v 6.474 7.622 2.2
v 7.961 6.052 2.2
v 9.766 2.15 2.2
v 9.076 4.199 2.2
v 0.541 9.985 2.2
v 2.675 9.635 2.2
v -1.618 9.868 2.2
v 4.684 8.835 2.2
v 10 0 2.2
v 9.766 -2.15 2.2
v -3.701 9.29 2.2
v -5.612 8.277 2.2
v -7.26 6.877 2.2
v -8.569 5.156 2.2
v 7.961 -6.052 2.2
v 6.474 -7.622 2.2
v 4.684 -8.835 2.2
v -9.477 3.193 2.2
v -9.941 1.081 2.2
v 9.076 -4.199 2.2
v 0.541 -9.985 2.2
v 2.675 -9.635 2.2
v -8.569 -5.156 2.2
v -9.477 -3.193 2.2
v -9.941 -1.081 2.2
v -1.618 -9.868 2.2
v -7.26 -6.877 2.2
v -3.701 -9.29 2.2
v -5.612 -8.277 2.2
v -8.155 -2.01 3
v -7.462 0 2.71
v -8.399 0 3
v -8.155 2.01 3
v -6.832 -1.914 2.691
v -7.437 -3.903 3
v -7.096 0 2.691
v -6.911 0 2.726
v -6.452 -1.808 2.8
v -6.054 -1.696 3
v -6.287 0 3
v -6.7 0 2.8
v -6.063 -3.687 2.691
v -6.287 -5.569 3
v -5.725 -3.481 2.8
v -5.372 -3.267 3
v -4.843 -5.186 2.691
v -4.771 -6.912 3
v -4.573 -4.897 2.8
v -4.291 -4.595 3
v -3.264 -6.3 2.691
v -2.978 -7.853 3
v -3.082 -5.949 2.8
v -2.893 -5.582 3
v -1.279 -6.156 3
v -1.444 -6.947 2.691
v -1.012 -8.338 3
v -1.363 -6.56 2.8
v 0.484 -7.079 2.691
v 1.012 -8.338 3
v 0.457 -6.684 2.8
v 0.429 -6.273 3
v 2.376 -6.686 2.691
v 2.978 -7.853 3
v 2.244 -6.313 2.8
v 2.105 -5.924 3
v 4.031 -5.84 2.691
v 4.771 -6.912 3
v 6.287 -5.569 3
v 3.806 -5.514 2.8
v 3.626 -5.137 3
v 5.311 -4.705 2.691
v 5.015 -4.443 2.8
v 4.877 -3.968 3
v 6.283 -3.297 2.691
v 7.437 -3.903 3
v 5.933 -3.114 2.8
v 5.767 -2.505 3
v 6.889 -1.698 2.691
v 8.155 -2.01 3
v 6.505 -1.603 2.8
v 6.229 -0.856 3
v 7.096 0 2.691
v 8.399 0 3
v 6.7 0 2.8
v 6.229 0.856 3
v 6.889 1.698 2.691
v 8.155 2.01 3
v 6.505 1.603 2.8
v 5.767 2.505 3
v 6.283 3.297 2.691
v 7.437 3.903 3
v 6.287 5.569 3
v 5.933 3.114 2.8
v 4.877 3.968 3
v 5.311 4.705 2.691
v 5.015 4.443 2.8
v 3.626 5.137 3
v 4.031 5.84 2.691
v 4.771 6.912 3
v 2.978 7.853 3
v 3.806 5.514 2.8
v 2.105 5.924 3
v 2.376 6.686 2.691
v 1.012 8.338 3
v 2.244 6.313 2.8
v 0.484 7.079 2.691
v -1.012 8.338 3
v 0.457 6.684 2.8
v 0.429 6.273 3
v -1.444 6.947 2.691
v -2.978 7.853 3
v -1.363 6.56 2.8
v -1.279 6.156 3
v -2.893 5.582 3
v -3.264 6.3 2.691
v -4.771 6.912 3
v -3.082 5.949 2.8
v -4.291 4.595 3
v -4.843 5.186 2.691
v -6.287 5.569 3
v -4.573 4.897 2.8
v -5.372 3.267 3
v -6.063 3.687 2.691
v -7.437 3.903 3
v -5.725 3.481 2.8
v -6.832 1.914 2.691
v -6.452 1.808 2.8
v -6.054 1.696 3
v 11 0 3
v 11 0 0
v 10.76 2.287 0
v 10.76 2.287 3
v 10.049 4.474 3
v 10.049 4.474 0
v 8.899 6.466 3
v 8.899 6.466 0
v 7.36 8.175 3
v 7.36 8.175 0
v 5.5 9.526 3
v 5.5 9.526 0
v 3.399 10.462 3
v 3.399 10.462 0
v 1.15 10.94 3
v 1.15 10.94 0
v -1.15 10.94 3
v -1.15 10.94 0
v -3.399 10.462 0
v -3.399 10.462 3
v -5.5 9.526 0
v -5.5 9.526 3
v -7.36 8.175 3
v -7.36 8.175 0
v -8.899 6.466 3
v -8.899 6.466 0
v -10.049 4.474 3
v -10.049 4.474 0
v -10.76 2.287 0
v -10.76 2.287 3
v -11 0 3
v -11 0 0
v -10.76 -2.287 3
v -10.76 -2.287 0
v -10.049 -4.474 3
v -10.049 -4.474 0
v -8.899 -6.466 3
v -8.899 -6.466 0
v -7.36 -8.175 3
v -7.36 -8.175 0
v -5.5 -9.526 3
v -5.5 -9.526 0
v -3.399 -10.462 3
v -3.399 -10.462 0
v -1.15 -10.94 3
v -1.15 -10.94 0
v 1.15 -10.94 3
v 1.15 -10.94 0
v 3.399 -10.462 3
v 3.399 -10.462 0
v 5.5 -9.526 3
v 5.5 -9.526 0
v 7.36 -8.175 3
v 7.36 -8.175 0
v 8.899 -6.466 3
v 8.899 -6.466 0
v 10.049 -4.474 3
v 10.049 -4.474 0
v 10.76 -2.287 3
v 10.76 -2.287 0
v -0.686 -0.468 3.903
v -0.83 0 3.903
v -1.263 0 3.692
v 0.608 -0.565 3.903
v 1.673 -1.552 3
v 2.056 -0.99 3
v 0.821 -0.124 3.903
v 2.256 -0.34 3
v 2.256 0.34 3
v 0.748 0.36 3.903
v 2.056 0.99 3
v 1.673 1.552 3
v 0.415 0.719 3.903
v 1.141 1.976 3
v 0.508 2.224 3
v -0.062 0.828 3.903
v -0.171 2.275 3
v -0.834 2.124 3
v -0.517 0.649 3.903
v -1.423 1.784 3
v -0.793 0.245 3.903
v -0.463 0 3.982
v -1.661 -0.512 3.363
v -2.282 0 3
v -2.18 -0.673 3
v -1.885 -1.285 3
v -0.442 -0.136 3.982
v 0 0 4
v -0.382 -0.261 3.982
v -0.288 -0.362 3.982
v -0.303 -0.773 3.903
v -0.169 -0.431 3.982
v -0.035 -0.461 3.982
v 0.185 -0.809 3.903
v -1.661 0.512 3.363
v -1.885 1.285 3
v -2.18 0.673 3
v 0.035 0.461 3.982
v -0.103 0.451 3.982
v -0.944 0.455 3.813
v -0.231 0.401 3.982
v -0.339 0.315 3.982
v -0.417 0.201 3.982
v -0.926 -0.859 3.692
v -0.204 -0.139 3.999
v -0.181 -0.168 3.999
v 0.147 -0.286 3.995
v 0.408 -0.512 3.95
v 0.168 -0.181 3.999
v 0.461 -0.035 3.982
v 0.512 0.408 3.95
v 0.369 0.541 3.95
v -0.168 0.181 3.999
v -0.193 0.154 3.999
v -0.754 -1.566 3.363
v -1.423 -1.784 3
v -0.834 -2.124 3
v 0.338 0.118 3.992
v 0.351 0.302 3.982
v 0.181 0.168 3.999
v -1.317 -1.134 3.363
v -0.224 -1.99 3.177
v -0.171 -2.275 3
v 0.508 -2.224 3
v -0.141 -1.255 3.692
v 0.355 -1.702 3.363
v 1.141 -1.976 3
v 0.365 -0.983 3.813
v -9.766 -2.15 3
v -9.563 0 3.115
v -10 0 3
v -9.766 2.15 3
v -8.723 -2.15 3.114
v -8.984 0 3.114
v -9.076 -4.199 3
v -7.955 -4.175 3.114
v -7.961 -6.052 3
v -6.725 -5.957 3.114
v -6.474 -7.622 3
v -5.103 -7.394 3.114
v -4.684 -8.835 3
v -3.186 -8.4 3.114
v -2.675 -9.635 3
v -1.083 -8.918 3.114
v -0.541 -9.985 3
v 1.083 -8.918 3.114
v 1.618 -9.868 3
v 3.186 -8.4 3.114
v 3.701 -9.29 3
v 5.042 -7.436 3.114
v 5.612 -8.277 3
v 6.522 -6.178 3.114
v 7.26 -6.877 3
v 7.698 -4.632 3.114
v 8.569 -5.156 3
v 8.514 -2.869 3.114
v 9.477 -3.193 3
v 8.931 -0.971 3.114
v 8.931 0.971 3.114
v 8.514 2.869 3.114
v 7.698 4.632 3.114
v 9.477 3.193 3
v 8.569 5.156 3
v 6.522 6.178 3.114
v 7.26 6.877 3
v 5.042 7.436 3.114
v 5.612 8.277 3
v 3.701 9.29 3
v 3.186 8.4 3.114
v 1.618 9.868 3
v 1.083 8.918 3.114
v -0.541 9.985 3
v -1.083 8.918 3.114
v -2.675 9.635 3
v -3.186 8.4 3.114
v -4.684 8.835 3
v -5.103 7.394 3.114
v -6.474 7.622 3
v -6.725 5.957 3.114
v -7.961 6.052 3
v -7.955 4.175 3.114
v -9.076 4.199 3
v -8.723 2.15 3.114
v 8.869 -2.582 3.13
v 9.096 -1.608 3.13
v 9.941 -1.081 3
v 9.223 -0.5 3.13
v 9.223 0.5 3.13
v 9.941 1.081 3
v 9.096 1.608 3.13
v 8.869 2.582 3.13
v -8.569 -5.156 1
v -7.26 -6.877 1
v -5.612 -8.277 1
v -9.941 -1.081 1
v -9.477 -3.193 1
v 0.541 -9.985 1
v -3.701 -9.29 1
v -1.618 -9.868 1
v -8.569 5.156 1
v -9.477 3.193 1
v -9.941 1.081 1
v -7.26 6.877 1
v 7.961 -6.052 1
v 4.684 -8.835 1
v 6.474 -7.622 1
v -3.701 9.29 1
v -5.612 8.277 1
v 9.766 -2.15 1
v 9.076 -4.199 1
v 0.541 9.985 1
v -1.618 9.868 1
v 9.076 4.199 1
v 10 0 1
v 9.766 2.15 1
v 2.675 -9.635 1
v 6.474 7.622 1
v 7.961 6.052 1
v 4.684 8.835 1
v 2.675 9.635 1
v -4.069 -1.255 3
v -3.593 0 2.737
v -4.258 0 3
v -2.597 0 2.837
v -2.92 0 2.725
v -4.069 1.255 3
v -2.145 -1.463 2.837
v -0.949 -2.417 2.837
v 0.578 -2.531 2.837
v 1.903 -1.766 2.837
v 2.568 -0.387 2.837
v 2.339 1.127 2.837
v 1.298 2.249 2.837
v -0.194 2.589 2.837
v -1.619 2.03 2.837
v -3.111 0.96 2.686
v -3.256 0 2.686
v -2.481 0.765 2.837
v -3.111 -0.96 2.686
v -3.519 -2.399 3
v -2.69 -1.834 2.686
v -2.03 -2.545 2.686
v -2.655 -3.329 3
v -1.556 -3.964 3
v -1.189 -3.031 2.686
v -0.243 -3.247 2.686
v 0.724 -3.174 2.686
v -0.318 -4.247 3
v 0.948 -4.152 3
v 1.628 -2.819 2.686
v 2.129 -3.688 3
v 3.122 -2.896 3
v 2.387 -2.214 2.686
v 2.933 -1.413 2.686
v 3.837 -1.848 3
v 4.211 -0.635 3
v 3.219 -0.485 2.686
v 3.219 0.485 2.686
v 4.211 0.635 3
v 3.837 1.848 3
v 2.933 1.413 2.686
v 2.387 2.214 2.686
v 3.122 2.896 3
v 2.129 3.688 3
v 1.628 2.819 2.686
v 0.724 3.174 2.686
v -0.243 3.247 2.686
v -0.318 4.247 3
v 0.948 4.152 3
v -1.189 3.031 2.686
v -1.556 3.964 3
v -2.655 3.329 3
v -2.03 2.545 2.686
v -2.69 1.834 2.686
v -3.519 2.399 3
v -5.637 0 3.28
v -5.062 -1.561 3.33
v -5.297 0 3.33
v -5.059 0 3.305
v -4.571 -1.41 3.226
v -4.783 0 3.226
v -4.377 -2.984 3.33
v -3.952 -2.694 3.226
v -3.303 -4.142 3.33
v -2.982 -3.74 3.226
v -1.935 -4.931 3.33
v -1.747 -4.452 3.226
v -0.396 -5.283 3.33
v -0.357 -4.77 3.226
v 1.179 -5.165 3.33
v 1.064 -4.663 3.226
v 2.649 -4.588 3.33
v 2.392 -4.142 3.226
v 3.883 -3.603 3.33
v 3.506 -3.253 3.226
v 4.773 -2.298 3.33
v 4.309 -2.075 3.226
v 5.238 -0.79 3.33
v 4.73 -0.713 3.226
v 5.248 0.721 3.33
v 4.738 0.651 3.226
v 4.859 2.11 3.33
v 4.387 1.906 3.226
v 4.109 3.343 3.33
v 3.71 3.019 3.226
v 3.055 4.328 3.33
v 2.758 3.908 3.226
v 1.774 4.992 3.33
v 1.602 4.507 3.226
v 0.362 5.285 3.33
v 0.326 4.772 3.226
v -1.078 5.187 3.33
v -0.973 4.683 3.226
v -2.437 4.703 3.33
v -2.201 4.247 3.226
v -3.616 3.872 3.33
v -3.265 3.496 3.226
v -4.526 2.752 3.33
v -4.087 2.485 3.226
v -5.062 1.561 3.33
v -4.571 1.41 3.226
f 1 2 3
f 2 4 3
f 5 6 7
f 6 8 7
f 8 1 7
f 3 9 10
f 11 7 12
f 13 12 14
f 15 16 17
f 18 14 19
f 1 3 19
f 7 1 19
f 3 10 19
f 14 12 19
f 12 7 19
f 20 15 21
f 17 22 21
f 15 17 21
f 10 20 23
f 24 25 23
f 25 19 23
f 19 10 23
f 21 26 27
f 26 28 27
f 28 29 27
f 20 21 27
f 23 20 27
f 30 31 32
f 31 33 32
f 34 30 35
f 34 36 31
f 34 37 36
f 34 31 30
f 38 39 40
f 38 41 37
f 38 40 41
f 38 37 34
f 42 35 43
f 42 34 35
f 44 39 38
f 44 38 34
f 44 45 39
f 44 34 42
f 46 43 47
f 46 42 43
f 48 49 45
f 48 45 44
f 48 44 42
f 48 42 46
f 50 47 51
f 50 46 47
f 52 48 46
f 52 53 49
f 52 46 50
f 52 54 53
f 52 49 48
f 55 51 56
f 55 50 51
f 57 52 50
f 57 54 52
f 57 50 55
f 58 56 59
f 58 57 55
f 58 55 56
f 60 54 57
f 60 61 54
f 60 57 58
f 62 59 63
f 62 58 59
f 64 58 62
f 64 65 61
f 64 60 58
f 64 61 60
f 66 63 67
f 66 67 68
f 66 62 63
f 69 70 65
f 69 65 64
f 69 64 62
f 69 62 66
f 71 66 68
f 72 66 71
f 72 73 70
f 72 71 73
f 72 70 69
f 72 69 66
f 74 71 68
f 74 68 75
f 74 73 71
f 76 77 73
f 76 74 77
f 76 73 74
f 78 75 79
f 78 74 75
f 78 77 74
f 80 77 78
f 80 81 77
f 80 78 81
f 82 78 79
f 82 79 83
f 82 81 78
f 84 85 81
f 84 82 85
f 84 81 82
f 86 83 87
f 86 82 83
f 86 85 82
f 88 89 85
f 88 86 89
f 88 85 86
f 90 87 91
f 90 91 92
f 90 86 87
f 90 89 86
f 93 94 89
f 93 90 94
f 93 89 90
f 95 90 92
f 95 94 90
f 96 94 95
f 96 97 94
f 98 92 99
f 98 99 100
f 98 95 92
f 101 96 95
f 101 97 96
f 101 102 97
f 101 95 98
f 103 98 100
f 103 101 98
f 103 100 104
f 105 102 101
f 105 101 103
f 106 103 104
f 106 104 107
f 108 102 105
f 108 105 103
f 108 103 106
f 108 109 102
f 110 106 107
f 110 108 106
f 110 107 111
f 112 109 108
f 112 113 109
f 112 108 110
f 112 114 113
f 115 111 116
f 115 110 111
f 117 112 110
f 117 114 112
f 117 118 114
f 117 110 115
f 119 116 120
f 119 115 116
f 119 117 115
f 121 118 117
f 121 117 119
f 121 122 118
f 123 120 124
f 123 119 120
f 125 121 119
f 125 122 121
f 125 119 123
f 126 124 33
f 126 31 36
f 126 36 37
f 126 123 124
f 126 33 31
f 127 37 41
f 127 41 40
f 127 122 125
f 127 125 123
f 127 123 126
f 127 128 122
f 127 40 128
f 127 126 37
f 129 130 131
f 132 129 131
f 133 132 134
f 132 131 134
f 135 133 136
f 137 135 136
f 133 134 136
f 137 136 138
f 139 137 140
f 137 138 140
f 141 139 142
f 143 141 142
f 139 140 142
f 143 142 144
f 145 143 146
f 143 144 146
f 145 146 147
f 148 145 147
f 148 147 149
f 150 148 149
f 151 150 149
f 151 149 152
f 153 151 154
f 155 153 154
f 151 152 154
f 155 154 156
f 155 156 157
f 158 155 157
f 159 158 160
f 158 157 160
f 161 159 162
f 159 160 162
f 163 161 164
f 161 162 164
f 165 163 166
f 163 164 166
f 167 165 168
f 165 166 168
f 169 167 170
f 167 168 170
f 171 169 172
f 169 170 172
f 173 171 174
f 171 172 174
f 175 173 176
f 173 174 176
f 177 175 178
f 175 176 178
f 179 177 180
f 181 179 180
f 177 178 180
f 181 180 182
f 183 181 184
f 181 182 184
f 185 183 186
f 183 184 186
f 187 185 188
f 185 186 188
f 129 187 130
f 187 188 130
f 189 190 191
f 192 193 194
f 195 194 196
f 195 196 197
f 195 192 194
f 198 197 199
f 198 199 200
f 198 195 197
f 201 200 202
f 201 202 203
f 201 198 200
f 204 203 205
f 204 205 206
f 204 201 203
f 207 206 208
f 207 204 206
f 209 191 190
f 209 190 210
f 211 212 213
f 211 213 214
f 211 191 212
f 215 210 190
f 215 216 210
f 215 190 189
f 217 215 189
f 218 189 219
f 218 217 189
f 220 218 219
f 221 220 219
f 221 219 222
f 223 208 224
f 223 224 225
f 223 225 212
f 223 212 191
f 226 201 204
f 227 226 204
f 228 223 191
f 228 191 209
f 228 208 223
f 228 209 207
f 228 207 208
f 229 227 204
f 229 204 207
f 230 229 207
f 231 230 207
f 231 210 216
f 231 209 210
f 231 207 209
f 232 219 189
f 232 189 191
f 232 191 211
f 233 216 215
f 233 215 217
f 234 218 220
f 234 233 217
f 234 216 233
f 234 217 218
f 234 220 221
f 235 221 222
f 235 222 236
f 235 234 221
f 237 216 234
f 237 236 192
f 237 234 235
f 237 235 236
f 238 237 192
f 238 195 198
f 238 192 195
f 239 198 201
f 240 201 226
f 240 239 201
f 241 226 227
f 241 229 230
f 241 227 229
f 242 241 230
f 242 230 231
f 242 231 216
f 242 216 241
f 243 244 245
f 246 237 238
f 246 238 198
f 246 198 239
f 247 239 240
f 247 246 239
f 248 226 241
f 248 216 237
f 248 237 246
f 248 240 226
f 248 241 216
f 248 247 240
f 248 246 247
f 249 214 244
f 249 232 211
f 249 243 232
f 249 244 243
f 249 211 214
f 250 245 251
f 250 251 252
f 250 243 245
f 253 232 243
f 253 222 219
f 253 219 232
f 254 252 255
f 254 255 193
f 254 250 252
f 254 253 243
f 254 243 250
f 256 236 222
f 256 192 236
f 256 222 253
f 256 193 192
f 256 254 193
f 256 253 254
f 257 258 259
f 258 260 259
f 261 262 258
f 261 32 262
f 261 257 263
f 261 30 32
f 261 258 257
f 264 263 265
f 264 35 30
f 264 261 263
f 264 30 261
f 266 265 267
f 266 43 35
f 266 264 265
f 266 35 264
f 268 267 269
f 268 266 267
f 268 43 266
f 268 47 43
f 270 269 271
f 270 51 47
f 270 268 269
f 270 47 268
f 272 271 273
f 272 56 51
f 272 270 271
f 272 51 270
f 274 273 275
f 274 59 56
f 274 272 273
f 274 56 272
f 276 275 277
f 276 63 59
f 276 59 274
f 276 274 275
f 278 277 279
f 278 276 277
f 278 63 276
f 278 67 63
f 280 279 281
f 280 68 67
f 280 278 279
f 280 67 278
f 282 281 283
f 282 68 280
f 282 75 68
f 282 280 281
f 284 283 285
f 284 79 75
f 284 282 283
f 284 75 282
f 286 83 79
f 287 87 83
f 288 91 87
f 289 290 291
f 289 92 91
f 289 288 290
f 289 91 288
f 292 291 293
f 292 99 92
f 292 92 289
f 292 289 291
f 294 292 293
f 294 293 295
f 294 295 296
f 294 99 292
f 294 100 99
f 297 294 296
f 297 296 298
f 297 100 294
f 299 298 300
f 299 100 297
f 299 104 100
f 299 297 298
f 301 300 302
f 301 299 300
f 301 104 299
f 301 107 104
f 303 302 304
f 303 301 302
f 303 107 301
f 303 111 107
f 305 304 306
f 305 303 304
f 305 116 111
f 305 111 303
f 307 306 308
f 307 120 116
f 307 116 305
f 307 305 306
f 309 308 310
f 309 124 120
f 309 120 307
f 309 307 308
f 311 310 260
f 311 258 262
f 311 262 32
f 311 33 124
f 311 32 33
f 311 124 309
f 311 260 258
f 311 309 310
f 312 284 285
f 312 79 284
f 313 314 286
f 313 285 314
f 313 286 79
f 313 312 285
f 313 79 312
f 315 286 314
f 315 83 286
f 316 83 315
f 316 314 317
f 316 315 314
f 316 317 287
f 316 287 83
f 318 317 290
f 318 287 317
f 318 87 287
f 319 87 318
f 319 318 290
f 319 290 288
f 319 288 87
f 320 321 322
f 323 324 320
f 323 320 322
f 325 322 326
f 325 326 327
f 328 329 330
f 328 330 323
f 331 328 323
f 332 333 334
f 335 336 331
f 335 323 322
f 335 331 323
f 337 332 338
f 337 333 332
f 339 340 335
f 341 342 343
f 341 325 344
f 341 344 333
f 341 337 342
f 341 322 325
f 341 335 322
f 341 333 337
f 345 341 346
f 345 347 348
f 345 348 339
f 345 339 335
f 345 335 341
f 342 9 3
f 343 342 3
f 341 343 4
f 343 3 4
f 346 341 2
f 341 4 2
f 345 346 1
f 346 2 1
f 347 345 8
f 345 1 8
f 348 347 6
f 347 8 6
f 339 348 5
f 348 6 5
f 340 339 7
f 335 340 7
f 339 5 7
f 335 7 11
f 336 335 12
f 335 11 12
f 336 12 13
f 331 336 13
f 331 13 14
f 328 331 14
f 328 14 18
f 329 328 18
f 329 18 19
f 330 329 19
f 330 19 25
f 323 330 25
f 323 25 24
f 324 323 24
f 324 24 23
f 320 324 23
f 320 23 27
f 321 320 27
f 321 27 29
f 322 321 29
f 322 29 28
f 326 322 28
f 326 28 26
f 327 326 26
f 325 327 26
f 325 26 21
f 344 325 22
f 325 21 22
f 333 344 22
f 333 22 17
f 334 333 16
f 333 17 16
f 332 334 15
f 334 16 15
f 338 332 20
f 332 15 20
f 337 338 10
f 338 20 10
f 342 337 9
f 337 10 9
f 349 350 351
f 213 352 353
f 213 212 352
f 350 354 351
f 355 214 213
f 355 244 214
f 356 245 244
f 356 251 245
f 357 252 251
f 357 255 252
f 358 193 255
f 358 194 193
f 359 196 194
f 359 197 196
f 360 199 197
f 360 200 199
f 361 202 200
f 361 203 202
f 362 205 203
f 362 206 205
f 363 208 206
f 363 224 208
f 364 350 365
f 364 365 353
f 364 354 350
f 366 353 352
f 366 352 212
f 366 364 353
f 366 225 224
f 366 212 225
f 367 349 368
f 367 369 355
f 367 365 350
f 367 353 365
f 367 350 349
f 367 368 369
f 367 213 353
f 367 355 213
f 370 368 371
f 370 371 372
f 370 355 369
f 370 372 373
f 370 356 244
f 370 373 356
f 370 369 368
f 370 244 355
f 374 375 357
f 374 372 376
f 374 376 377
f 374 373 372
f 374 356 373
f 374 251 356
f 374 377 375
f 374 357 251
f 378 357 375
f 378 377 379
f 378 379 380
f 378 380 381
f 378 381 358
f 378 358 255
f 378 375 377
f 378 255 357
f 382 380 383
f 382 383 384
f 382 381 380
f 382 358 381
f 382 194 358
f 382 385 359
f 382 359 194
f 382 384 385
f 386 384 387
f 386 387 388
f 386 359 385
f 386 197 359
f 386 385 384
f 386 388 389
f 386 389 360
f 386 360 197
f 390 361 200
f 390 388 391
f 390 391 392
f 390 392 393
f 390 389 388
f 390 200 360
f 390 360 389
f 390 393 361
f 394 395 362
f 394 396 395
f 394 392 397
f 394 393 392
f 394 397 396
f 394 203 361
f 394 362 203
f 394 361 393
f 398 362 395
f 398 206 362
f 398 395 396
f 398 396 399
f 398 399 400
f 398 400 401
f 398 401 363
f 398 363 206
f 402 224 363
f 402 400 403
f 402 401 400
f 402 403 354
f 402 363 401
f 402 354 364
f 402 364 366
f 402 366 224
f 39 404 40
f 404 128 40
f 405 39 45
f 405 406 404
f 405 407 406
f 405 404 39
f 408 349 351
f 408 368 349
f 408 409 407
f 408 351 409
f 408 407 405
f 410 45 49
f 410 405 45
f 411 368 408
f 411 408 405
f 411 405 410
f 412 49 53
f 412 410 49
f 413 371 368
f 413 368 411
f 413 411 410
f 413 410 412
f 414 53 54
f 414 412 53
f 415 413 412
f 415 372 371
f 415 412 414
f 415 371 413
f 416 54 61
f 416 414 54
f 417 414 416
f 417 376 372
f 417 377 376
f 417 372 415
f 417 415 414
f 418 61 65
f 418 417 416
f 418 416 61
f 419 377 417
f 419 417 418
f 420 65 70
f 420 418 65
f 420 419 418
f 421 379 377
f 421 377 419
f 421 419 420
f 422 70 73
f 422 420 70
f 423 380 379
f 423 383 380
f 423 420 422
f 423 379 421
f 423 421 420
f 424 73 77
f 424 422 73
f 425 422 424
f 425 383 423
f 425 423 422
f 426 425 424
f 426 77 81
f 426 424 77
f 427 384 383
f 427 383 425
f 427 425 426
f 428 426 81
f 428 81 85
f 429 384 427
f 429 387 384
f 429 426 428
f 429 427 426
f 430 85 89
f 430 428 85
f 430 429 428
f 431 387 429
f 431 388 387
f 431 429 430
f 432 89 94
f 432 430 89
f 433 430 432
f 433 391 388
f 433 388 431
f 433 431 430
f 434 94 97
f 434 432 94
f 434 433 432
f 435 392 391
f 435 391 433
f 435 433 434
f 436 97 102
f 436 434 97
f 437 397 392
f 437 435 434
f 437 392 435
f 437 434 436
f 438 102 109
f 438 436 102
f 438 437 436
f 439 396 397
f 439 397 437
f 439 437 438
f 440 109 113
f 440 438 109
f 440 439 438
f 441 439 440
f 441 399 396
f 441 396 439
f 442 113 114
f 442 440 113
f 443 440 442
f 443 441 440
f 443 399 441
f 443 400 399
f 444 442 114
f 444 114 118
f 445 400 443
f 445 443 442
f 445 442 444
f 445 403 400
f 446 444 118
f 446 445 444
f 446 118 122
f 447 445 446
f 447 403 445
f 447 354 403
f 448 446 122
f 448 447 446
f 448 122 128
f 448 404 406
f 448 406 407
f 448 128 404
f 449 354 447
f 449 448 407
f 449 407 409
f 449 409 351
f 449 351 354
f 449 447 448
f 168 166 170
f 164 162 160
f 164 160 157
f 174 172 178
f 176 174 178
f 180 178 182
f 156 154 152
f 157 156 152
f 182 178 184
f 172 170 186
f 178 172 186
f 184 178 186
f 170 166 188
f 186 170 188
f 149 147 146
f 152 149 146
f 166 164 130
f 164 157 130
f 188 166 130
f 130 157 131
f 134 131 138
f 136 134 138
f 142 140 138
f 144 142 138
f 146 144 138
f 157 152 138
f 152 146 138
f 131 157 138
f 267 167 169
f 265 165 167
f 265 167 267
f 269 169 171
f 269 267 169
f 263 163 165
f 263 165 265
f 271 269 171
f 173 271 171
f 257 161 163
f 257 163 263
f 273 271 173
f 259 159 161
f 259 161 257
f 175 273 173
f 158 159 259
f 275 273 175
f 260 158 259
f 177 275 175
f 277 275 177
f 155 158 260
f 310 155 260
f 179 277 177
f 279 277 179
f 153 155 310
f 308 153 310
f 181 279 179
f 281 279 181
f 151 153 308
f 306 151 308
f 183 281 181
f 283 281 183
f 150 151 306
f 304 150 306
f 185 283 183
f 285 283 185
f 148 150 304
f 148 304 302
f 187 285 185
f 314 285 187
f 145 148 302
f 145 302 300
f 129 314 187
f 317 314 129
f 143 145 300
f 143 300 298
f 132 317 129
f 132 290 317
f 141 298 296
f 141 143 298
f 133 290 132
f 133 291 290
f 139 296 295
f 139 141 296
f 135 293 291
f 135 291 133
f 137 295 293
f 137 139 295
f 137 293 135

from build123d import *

# Parameters (mm, degrees)
F0_R     = 11
F1_DEPTH = 3
F2_R     = 10
F3_DEPTH = 2


with BuildPart() as f1:
    # F0 (on Top) → F1 (new body)
    with BuildSketch(Plane.XY):
        Circle(F0_R)
    extrude(amount=F1_DEPTH)

    # F2 (on face) → F3 (cut)
    with BuildSketch(Plane.XY.offset(3)):
        Circle(F2_R)
    extrude(amount=-F3_DEPTH, mode=Mode.SUBTRACT)

    # F4 (on Front) → F5 (revolve)
    with BuildSketch(Plane.XZ):
        with BuildLine():
            add(Edge.make_bspline(
                [(-10, 3), (-9.5631365163, 3.1947120998), (-8.9358639257, 3.1521992443), (-8.3988746628, 3)],
                knots=[0, 0, 0, 0, 0.1598537325, 0.1598537325, 0.1598537325, 0.1598537325], degree=3))
            Line((-10, 3), (-8.3988746628, 3))
        make_face()
        with BuildLine():
            Line((-8.3988746628, 3), (-10, 3))
            Line((-10, 3), (-10, 2.2))
            Line((-10, 2.2), (0, 2.2))
            Line((0, 2.2), (0, 3))
            Line((0, 3), (-2.2816949674, 3))
            add(Edge.make_bspline(
                [(-4.2584559222, 3), (-3.9238062504, 2.8445189646), (-3.2540976505, 2.5415343681), (-2.5906789659, 2.8182773792), (-2.2816949674, 3)],
                knots=[0.5757910273, 0.5757910273, 0.5757910273, 0.5757910273, 0.6661755998, 0.754812685, 0.754812685, 0.754812685, 0.754812685], degree=3))
            Line((-4.2584559222, 3), (-6.2872854841, 3))
            add(Edge.make_bspline(
                [(-8.3988746628, 3), (-7.8910468525, 2.8560660067), (-7.2552687251, 2.4957672366), (-6.5324171697, 2.8740056535), (-6.2872854841, 3)],
                knots=[0.1598537325, 0.1598537325, 0.1598537325, 0.1598537325, 0.3110265335, 0.3848969639, 0.3848969639, 0.3848969639, 0.3848969639], degree=3))
        make_face()
        with BuildLine():
            add(Edge.make_bspline(
                [(-6.2872854841, 3), (-5.9671465556, 3.1645470474), (-5.3071713867, 3.4963401186), (-4.6080475442, 3.1624231904), (-4.2584559222, 3)],
                knots=[0.3848969639, 0.3848969639, 0.3848969639, 0.3848969639, 0.4813708261, 0.5757910273, 0.5757910273, 0.5757910273, 0.5757910273], degree=3))
            Line((-6.2872854841, 3), (-4.2584559222, 3))
        make_face()
        with BuildLine():
            Line((-2.2816949674, 3), (0, 3))
            Line((0, 3), (0, 4))
            add(Edge.make_bspline(
                [(-2.2816949674, 3), (-1.9564930944, 3.191260832), (-1.1585189995, 3.8240848781), (-0.654182455, 4.0144366212), (0, 4)],
                knots=[0.754812685, 0.754812685, 0.754812685, 0.754812685, 0.8481021313, 1, 1, 1, 1], degree=3))
        make_face()
    revolve(axis=Axis((0, 0, 3.1), (0, 0, 1)))


solid = f1.part
